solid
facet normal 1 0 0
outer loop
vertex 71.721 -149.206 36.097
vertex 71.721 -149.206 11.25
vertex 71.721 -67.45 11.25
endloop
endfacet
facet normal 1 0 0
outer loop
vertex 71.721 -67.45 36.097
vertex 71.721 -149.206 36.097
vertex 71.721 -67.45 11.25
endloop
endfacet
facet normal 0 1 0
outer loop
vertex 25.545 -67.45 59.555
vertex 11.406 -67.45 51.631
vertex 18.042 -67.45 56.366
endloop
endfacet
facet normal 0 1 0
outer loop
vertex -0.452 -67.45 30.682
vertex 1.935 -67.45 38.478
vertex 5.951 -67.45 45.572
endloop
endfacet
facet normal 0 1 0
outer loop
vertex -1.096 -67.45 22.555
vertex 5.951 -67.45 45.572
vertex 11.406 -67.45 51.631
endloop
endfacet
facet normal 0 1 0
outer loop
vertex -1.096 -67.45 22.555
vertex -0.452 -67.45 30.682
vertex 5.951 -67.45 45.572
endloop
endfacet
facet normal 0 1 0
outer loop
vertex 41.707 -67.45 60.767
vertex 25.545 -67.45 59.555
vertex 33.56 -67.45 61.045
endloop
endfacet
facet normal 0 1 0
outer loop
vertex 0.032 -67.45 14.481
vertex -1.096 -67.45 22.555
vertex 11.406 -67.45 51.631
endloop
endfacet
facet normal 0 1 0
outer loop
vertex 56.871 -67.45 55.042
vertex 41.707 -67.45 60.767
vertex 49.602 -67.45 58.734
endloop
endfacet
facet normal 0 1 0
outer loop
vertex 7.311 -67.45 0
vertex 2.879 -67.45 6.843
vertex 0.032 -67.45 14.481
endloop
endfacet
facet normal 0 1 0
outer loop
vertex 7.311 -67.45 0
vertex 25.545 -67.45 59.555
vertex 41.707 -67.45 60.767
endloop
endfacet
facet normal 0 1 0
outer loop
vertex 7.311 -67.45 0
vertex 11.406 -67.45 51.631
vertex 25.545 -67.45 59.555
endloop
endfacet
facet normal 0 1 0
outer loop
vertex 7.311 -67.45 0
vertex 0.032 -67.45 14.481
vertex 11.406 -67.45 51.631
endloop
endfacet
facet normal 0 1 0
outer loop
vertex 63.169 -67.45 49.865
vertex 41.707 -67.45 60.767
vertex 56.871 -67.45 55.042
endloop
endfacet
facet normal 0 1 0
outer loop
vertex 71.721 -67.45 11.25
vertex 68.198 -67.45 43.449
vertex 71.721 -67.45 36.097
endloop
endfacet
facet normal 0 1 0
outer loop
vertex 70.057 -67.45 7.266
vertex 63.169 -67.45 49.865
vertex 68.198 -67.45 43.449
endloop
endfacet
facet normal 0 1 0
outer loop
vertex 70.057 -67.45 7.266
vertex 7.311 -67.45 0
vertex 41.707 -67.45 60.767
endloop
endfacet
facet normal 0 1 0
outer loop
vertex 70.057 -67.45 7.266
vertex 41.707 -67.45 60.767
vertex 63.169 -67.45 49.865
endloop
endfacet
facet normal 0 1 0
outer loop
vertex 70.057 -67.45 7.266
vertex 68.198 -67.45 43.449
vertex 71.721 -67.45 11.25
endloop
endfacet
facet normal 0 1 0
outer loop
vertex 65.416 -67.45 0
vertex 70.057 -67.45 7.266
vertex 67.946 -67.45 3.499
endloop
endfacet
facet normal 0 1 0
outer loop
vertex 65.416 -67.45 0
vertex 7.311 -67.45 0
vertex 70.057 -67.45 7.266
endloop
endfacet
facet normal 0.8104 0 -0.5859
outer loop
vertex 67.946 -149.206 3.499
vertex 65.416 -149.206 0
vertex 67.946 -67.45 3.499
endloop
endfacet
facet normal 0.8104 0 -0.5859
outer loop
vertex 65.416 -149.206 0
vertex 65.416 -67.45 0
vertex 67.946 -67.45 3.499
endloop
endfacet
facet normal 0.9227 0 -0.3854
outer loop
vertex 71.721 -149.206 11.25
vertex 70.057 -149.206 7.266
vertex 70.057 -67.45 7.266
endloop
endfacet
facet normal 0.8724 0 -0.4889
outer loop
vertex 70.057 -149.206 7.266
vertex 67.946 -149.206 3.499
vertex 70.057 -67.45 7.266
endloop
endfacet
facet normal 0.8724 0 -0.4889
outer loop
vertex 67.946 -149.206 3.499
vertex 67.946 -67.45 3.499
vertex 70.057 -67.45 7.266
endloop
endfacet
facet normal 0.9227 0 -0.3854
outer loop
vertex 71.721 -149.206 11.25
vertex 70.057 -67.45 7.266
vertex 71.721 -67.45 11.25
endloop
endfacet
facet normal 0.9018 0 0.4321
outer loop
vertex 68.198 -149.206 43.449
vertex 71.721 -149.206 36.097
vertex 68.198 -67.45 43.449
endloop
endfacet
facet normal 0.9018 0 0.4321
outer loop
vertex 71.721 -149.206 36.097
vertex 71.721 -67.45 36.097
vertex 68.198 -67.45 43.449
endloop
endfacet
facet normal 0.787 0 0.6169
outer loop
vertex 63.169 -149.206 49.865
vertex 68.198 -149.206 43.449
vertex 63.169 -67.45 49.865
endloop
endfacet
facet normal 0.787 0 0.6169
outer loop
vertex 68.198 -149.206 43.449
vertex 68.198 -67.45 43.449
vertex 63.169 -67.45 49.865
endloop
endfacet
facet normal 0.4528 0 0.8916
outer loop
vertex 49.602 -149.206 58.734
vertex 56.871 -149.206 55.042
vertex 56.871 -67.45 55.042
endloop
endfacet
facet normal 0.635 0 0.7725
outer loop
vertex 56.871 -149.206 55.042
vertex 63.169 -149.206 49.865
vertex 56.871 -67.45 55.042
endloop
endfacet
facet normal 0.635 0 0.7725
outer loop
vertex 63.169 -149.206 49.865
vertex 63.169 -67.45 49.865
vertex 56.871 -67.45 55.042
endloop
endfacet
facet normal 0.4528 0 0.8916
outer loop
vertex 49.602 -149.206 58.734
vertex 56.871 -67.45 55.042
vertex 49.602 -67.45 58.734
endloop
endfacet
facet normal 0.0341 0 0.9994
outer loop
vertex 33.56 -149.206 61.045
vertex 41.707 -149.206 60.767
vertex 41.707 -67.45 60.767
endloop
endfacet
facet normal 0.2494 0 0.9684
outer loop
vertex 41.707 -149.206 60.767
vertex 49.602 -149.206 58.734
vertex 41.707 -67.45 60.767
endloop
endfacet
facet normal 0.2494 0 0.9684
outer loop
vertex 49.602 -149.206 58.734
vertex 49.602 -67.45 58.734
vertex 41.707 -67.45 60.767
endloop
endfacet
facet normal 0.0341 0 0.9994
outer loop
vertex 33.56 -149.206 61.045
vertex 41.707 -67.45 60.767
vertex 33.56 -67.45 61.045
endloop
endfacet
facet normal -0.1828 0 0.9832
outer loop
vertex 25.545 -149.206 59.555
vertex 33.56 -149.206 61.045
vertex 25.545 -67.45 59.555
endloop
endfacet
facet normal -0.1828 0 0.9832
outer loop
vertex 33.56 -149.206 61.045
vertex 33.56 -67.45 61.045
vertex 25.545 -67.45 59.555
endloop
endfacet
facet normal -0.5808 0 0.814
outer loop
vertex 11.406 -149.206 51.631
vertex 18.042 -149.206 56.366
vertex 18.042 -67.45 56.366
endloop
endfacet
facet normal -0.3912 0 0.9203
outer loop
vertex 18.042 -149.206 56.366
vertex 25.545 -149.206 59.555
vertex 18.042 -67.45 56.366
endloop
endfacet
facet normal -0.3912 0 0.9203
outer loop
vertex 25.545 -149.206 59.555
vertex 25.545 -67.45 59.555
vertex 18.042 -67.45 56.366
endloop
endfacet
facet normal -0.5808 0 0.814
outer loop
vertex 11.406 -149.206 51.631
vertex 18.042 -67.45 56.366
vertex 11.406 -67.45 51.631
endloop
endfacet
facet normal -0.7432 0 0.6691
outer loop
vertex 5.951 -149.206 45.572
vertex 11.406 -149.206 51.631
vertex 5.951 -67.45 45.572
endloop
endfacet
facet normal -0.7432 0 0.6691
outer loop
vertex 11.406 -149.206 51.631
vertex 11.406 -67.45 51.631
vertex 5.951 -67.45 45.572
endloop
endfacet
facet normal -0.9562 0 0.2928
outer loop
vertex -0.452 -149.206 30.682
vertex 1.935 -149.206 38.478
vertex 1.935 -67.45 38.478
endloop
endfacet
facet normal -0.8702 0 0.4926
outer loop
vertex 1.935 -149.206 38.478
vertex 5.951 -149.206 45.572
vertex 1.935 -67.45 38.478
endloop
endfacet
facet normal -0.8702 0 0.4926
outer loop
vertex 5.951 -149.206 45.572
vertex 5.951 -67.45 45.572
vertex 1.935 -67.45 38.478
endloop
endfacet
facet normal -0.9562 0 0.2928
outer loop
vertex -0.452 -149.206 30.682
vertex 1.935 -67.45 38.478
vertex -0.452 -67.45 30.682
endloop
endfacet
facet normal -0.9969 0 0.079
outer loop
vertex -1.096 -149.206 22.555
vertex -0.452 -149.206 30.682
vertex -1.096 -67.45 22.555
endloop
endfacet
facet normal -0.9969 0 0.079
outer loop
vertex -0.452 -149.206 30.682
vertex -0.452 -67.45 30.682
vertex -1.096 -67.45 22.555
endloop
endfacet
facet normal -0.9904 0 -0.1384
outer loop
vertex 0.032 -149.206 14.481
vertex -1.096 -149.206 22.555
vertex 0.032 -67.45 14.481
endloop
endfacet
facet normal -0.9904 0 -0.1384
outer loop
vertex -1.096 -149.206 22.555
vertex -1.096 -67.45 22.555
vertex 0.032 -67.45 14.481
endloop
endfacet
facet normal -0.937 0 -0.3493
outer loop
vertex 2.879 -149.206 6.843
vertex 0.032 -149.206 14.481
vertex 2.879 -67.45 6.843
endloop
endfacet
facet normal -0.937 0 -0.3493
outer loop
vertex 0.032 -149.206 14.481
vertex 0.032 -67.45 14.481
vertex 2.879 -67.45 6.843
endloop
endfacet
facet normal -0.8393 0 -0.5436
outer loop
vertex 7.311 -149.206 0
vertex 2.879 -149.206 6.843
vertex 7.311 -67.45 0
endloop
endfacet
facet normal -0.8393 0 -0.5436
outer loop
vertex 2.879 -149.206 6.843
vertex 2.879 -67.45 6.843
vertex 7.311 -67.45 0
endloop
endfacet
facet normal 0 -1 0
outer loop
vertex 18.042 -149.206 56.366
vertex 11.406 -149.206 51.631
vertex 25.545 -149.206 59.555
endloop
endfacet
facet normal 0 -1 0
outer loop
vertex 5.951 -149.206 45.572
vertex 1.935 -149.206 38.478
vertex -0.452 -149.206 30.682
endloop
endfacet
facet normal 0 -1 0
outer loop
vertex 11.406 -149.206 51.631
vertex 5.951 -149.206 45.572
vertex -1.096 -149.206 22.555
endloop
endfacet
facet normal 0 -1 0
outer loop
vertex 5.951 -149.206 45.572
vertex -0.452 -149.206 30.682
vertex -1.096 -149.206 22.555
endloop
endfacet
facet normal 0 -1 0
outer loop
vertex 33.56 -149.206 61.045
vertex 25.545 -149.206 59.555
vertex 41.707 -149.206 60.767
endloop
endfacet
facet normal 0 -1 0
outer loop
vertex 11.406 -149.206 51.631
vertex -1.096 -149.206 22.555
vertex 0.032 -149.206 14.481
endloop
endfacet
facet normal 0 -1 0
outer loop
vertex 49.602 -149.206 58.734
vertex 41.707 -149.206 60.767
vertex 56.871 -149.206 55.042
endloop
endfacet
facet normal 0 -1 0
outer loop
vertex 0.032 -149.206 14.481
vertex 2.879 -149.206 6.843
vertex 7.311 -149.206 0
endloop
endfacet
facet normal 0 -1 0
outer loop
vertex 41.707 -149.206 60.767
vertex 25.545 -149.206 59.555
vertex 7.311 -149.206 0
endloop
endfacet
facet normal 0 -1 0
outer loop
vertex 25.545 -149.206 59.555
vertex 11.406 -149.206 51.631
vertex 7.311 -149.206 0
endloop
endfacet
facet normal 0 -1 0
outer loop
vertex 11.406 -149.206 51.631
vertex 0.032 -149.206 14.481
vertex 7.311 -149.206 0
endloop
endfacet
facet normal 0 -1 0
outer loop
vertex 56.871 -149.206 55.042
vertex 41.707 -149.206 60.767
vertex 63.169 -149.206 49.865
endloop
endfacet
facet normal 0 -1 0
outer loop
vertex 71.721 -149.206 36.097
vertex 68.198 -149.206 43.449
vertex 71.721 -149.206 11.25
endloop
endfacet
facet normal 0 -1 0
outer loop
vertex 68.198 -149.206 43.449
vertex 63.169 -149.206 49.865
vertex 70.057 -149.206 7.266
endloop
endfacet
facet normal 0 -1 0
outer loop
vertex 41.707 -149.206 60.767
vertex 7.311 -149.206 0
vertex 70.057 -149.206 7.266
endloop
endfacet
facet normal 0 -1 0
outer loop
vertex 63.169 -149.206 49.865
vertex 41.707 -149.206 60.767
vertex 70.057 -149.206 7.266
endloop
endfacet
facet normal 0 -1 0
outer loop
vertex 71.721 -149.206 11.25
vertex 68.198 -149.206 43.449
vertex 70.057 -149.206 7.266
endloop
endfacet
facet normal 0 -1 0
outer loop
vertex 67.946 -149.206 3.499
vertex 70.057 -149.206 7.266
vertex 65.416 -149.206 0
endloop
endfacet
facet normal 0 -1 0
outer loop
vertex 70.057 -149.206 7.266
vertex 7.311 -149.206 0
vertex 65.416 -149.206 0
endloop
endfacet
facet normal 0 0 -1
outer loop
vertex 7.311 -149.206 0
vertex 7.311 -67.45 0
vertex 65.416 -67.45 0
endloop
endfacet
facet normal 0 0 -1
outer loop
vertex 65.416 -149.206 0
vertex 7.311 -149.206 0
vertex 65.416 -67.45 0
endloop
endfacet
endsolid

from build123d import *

# Parameters (mm, degrees)
F0_R     = 37.476533
F1_DEPTH = 196.006492
F2_W     = 109.178945
F2_H     = 81.75566
F3_DEPTH = 113.557346


with BuildPart() as f1:
    # F0 (on Front) → F1 (new body)
    with BuildSketch(Plane.XZ):
        with Locations((36.363707, 23.673844)):
            Circle(F0_R)
    extrude(amount=F1_DEPTH)


with BuildPart() as f3:
    # F2 (on Top) → F3 (new body)
    with BuildSketch(Plane.XY):
        with Locations((17.131656, -108.327765)):
            Rectangle(F2_W, F2_H)
    extrude(amount=F3_DEPTH)

    # F4: intersect F1
    add(f1.part, mode=Mode.INTERSECT)


solid = f3.part
